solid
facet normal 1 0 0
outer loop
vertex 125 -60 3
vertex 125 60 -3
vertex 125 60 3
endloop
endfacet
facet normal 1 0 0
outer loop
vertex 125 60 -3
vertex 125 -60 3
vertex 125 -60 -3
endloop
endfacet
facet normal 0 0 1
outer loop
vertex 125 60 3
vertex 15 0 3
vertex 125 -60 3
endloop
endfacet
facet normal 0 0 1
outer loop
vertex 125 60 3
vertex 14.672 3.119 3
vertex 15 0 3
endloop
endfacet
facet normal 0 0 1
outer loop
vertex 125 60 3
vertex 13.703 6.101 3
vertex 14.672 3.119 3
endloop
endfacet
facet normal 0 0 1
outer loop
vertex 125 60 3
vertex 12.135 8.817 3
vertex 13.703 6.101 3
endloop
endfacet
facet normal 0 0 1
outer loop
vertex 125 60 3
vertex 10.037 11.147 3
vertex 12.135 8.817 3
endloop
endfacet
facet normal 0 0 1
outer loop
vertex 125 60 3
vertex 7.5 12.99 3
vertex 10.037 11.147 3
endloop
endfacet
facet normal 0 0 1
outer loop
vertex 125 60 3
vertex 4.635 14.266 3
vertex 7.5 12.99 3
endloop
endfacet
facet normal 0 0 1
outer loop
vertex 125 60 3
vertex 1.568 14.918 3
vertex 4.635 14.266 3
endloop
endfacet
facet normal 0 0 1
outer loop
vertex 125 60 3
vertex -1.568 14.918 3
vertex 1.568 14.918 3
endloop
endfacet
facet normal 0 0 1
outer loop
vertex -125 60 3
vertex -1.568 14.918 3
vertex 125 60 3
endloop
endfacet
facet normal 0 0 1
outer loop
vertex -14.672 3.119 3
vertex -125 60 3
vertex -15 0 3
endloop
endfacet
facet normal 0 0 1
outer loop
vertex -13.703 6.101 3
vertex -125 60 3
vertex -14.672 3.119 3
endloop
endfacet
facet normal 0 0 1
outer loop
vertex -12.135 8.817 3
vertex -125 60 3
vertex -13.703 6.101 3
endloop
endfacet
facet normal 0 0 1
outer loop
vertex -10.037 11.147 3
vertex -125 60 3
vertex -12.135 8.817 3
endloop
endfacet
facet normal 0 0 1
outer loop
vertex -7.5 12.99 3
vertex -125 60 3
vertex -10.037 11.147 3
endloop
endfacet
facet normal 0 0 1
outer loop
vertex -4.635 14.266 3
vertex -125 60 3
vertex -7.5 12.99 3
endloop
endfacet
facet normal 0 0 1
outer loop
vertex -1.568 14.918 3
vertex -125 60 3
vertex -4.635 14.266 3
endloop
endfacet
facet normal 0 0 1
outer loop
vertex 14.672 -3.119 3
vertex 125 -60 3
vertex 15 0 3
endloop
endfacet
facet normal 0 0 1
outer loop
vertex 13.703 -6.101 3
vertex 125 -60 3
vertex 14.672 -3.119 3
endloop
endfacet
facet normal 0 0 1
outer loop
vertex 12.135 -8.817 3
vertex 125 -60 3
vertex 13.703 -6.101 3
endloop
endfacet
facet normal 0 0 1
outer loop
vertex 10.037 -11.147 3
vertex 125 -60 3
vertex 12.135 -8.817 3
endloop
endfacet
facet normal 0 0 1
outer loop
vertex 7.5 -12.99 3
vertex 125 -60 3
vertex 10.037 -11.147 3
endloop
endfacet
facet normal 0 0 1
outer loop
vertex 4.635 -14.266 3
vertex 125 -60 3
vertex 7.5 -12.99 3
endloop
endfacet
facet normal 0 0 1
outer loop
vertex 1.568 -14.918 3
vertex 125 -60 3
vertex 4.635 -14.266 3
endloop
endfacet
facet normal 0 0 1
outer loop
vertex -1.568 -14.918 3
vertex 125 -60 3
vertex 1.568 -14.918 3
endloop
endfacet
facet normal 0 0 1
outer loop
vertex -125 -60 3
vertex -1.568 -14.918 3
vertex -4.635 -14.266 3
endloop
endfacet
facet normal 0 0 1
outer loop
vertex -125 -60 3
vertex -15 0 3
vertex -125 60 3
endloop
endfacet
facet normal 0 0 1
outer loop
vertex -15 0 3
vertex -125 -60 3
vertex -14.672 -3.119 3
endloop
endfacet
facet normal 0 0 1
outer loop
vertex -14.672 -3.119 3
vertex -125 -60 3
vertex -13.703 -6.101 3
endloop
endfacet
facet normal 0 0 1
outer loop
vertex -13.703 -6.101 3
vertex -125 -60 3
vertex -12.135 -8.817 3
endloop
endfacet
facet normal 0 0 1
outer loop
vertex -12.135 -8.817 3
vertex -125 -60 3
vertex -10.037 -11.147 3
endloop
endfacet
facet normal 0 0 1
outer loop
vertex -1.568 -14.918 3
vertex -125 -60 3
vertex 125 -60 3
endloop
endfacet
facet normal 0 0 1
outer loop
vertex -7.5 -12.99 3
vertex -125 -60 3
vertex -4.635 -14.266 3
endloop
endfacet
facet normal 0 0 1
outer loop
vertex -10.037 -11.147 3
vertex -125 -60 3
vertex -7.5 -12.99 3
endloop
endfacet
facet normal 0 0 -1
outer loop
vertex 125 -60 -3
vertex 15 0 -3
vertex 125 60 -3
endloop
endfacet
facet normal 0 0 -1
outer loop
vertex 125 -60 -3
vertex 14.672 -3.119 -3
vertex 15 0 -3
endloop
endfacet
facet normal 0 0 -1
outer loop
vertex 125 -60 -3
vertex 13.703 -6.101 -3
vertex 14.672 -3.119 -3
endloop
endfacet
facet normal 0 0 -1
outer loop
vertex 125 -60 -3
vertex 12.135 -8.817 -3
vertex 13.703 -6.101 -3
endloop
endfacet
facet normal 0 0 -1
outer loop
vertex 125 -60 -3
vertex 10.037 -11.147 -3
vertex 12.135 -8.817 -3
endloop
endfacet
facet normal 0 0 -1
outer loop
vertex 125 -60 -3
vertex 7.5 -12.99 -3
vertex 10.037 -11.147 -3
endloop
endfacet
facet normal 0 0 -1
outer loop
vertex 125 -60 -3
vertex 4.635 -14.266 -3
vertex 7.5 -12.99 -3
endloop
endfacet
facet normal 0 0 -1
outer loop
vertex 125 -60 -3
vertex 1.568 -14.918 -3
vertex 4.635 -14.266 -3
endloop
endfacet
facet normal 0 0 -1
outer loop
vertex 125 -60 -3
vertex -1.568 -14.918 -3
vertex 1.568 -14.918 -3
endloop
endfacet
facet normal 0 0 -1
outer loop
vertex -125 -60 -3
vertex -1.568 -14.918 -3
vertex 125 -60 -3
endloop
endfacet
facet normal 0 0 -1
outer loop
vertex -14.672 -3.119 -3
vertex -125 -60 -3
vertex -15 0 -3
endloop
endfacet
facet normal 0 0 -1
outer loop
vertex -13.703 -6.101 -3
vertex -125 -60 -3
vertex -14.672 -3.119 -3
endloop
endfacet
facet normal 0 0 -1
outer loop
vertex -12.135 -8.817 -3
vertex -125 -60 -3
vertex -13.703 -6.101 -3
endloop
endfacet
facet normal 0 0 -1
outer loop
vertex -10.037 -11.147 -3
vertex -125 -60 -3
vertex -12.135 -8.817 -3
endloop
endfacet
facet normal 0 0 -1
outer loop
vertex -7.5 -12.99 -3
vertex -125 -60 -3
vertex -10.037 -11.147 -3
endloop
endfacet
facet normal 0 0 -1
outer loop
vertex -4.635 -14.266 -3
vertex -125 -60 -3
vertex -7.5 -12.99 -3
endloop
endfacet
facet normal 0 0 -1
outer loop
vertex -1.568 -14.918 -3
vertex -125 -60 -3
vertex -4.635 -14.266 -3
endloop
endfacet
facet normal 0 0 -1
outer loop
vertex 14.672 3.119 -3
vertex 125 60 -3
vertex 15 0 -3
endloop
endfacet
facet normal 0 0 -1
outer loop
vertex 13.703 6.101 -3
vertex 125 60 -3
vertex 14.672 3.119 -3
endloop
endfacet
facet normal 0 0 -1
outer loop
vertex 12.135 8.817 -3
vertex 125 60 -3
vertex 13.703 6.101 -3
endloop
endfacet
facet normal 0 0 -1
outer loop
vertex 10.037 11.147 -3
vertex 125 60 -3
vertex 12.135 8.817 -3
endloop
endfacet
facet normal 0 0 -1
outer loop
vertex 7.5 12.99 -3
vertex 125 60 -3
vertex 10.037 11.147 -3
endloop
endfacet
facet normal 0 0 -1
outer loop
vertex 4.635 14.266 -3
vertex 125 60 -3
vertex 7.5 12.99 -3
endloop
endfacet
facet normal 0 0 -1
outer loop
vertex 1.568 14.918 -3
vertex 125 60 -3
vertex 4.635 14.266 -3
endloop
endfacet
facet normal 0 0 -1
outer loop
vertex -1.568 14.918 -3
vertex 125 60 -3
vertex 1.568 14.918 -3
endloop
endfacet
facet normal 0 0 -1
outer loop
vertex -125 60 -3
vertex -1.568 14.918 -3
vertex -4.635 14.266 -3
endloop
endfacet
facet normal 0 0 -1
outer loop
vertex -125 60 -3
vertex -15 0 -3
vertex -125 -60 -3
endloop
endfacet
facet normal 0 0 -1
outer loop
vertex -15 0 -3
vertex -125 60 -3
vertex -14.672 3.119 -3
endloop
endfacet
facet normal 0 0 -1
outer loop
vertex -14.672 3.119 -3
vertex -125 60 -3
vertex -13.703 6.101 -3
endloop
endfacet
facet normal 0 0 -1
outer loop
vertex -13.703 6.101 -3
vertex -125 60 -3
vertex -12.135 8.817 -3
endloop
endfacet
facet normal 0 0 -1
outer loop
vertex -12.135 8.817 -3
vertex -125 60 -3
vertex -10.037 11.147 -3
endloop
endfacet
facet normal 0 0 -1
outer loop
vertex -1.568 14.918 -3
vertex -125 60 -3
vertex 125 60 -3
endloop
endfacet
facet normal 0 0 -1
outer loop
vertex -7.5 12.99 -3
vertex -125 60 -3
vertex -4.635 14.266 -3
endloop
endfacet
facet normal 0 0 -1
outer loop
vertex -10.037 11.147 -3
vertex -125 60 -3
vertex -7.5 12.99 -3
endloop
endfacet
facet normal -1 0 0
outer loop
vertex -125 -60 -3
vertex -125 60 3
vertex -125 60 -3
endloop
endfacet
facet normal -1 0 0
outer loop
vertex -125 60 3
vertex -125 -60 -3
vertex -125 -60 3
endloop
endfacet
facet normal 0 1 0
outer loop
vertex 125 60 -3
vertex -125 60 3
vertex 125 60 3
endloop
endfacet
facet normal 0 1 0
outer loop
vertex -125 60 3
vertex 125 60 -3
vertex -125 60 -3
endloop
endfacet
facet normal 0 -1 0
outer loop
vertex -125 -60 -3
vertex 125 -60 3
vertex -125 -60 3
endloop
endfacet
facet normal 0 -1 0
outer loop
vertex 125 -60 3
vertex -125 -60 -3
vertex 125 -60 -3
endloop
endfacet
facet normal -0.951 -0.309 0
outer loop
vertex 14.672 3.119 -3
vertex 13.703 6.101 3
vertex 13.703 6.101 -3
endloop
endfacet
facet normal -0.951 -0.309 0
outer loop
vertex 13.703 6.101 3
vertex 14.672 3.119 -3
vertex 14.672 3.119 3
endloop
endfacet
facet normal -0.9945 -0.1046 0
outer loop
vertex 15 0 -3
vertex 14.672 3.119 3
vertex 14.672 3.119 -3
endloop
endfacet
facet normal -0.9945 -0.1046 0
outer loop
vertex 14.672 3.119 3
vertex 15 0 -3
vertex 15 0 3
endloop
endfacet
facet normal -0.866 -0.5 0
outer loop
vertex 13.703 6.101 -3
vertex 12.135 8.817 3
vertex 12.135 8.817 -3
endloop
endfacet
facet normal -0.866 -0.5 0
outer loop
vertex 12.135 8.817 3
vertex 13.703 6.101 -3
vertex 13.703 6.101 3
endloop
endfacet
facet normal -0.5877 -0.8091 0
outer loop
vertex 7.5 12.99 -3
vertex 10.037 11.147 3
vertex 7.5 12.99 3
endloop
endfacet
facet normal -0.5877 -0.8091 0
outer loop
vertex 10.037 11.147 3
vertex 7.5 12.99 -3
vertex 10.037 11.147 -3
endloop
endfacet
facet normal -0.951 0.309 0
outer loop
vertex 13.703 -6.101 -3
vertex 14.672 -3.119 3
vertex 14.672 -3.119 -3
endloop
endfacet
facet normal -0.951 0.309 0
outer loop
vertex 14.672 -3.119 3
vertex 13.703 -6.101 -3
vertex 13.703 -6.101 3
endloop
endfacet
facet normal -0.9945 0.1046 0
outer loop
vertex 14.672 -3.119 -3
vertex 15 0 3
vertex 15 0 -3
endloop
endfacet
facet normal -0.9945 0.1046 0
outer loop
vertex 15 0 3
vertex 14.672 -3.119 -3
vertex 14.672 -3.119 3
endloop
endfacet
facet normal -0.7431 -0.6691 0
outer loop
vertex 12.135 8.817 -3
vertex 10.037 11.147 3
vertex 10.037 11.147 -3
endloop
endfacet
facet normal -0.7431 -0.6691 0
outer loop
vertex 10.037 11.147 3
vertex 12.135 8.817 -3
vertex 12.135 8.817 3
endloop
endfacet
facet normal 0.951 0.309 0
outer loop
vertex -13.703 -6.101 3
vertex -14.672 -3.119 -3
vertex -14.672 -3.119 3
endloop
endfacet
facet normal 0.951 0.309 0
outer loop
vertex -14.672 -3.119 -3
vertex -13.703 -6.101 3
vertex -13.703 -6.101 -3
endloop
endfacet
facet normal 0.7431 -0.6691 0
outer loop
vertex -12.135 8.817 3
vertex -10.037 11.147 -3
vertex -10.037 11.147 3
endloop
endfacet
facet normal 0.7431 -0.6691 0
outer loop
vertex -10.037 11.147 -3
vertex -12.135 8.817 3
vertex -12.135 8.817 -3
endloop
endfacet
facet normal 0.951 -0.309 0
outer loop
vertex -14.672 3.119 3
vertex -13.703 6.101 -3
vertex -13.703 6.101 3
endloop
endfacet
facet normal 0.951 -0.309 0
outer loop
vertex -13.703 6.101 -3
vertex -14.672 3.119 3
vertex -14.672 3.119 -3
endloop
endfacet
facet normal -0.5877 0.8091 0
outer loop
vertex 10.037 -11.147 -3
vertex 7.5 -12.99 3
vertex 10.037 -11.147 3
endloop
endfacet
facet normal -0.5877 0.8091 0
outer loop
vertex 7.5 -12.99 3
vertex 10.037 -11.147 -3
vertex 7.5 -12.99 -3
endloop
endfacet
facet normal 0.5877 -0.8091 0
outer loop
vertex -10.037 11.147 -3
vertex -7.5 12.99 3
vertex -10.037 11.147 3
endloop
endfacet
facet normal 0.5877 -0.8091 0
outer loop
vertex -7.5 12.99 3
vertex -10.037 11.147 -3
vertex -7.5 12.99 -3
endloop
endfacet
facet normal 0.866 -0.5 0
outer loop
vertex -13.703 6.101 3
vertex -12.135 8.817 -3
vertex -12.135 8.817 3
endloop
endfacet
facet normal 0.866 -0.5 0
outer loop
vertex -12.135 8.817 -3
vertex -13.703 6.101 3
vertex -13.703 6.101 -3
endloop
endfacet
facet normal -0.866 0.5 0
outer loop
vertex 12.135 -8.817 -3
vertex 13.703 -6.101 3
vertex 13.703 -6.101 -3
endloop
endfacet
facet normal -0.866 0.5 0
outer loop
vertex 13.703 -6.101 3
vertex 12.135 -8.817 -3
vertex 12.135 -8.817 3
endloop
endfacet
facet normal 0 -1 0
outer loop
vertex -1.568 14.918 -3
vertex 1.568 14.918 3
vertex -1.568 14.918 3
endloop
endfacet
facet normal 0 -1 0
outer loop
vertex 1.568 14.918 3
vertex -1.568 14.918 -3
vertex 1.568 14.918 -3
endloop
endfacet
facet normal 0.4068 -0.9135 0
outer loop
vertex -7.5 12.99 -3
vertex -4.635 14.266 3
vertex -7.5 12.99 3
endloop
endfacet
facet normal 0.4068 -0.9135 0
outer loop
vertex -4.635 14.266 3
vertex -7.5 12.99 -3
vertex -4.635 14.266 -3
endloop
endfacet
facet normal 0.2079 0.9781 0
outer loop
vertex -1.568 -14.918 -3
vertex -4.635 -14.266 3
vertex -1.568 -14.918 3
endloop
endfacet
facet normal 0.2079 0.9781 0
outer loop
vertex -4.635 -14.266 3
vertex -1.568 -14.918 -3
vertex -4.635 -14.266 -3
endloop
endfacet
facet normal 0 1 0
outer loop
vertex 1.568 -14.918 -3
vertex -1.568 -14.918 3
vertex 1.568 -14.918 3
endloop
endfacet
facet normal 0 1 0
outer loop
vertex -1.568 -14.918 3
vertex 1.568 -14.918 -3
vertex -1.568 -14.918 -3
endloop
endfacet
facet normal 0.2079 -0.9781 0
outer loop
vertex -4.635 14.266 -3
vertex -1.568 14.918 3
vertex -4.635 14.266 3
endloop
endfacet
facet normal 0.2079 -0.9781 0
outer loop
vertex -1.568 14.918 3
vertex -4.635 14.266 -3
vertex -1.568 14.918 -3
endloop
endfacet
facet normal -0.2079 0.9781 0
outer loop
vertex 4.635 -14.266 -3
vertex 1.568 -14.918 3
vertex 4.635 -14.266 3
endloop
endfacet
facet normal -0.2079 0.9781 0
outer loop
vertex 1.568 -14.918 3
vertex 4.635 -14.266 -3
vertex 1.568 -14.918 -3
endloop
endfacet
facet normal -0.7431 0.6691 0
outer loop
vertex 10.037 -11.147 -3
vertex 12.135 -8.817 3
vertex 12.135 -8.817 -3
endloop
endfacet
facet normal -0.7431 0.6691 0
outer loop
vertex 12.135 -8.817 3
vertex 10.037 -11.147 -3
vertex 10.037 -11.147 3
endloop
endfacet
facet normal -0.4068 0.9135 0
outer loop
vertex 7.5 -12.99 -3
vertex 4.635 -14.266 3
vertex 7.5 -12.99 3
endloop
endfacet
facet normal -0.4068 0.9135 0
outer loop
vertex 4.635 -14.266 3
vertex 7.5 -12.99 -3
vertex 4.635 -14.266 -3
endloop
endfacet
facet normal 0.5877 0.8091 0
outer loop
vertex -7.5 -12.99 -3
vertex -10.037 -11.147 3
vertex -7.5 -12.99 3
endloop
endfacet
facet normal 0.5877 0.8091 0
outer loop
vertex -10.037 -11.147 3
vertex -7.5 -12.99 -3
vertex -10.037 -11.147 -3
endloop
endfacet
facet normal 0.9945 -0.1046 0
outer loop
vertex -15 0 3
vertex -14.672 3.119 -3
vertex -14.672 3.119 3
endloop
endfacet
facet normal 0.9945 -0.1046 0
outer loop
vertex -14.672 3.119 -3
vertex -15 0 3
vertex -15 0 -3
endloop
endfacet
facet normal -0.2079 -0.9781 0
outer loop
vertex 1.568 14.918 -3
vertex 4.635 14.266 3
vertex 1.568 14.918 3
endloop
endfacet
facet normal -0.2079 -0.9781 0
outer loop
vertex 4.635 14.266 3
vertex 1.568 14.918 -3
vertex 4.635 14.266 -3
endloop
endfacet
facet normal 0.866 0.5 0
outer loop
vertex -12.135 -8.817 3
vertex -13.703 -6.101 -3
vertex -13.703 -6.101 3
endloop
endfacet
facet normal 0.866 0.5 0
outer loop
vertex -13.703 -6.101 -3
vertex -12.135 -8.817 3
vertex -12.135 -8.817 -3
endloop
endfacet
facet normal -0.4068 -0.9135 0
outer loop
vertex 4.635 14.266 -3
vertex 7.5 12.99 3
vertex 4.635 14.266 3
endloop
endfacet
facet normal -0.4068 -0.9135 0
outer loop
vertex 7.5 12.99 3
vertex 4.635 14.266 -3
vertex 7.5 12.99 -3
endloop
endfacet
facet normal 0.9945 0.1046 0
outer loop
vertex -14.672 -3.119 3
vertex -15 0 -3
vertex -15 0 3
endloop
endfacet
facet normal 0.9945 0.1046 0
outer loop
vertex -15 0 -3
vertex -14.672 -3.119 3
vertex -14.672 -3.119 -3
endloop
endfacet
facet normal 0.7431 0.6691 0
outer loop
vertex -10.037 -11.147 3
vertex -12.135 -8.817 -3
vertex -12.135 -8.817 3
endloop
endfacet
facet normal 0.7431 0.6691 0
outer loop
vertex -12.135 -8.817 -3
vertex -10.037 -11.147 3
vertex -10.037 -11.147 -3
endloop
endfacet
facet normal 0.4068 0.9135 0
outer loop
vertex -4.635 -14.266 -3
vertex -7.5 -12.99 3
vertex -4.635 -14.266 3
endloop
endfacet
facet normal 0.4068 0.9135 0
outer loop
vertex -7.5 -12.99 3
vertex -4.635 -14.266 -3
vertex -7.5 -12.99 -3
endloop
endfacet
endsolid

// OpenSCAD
width = 120;
length = 250;
height = 6;
hole = 30;

difference() {
    cube([length, width, height], true);
    cylinder(height*2, hole/2, hole/2, true);
}
